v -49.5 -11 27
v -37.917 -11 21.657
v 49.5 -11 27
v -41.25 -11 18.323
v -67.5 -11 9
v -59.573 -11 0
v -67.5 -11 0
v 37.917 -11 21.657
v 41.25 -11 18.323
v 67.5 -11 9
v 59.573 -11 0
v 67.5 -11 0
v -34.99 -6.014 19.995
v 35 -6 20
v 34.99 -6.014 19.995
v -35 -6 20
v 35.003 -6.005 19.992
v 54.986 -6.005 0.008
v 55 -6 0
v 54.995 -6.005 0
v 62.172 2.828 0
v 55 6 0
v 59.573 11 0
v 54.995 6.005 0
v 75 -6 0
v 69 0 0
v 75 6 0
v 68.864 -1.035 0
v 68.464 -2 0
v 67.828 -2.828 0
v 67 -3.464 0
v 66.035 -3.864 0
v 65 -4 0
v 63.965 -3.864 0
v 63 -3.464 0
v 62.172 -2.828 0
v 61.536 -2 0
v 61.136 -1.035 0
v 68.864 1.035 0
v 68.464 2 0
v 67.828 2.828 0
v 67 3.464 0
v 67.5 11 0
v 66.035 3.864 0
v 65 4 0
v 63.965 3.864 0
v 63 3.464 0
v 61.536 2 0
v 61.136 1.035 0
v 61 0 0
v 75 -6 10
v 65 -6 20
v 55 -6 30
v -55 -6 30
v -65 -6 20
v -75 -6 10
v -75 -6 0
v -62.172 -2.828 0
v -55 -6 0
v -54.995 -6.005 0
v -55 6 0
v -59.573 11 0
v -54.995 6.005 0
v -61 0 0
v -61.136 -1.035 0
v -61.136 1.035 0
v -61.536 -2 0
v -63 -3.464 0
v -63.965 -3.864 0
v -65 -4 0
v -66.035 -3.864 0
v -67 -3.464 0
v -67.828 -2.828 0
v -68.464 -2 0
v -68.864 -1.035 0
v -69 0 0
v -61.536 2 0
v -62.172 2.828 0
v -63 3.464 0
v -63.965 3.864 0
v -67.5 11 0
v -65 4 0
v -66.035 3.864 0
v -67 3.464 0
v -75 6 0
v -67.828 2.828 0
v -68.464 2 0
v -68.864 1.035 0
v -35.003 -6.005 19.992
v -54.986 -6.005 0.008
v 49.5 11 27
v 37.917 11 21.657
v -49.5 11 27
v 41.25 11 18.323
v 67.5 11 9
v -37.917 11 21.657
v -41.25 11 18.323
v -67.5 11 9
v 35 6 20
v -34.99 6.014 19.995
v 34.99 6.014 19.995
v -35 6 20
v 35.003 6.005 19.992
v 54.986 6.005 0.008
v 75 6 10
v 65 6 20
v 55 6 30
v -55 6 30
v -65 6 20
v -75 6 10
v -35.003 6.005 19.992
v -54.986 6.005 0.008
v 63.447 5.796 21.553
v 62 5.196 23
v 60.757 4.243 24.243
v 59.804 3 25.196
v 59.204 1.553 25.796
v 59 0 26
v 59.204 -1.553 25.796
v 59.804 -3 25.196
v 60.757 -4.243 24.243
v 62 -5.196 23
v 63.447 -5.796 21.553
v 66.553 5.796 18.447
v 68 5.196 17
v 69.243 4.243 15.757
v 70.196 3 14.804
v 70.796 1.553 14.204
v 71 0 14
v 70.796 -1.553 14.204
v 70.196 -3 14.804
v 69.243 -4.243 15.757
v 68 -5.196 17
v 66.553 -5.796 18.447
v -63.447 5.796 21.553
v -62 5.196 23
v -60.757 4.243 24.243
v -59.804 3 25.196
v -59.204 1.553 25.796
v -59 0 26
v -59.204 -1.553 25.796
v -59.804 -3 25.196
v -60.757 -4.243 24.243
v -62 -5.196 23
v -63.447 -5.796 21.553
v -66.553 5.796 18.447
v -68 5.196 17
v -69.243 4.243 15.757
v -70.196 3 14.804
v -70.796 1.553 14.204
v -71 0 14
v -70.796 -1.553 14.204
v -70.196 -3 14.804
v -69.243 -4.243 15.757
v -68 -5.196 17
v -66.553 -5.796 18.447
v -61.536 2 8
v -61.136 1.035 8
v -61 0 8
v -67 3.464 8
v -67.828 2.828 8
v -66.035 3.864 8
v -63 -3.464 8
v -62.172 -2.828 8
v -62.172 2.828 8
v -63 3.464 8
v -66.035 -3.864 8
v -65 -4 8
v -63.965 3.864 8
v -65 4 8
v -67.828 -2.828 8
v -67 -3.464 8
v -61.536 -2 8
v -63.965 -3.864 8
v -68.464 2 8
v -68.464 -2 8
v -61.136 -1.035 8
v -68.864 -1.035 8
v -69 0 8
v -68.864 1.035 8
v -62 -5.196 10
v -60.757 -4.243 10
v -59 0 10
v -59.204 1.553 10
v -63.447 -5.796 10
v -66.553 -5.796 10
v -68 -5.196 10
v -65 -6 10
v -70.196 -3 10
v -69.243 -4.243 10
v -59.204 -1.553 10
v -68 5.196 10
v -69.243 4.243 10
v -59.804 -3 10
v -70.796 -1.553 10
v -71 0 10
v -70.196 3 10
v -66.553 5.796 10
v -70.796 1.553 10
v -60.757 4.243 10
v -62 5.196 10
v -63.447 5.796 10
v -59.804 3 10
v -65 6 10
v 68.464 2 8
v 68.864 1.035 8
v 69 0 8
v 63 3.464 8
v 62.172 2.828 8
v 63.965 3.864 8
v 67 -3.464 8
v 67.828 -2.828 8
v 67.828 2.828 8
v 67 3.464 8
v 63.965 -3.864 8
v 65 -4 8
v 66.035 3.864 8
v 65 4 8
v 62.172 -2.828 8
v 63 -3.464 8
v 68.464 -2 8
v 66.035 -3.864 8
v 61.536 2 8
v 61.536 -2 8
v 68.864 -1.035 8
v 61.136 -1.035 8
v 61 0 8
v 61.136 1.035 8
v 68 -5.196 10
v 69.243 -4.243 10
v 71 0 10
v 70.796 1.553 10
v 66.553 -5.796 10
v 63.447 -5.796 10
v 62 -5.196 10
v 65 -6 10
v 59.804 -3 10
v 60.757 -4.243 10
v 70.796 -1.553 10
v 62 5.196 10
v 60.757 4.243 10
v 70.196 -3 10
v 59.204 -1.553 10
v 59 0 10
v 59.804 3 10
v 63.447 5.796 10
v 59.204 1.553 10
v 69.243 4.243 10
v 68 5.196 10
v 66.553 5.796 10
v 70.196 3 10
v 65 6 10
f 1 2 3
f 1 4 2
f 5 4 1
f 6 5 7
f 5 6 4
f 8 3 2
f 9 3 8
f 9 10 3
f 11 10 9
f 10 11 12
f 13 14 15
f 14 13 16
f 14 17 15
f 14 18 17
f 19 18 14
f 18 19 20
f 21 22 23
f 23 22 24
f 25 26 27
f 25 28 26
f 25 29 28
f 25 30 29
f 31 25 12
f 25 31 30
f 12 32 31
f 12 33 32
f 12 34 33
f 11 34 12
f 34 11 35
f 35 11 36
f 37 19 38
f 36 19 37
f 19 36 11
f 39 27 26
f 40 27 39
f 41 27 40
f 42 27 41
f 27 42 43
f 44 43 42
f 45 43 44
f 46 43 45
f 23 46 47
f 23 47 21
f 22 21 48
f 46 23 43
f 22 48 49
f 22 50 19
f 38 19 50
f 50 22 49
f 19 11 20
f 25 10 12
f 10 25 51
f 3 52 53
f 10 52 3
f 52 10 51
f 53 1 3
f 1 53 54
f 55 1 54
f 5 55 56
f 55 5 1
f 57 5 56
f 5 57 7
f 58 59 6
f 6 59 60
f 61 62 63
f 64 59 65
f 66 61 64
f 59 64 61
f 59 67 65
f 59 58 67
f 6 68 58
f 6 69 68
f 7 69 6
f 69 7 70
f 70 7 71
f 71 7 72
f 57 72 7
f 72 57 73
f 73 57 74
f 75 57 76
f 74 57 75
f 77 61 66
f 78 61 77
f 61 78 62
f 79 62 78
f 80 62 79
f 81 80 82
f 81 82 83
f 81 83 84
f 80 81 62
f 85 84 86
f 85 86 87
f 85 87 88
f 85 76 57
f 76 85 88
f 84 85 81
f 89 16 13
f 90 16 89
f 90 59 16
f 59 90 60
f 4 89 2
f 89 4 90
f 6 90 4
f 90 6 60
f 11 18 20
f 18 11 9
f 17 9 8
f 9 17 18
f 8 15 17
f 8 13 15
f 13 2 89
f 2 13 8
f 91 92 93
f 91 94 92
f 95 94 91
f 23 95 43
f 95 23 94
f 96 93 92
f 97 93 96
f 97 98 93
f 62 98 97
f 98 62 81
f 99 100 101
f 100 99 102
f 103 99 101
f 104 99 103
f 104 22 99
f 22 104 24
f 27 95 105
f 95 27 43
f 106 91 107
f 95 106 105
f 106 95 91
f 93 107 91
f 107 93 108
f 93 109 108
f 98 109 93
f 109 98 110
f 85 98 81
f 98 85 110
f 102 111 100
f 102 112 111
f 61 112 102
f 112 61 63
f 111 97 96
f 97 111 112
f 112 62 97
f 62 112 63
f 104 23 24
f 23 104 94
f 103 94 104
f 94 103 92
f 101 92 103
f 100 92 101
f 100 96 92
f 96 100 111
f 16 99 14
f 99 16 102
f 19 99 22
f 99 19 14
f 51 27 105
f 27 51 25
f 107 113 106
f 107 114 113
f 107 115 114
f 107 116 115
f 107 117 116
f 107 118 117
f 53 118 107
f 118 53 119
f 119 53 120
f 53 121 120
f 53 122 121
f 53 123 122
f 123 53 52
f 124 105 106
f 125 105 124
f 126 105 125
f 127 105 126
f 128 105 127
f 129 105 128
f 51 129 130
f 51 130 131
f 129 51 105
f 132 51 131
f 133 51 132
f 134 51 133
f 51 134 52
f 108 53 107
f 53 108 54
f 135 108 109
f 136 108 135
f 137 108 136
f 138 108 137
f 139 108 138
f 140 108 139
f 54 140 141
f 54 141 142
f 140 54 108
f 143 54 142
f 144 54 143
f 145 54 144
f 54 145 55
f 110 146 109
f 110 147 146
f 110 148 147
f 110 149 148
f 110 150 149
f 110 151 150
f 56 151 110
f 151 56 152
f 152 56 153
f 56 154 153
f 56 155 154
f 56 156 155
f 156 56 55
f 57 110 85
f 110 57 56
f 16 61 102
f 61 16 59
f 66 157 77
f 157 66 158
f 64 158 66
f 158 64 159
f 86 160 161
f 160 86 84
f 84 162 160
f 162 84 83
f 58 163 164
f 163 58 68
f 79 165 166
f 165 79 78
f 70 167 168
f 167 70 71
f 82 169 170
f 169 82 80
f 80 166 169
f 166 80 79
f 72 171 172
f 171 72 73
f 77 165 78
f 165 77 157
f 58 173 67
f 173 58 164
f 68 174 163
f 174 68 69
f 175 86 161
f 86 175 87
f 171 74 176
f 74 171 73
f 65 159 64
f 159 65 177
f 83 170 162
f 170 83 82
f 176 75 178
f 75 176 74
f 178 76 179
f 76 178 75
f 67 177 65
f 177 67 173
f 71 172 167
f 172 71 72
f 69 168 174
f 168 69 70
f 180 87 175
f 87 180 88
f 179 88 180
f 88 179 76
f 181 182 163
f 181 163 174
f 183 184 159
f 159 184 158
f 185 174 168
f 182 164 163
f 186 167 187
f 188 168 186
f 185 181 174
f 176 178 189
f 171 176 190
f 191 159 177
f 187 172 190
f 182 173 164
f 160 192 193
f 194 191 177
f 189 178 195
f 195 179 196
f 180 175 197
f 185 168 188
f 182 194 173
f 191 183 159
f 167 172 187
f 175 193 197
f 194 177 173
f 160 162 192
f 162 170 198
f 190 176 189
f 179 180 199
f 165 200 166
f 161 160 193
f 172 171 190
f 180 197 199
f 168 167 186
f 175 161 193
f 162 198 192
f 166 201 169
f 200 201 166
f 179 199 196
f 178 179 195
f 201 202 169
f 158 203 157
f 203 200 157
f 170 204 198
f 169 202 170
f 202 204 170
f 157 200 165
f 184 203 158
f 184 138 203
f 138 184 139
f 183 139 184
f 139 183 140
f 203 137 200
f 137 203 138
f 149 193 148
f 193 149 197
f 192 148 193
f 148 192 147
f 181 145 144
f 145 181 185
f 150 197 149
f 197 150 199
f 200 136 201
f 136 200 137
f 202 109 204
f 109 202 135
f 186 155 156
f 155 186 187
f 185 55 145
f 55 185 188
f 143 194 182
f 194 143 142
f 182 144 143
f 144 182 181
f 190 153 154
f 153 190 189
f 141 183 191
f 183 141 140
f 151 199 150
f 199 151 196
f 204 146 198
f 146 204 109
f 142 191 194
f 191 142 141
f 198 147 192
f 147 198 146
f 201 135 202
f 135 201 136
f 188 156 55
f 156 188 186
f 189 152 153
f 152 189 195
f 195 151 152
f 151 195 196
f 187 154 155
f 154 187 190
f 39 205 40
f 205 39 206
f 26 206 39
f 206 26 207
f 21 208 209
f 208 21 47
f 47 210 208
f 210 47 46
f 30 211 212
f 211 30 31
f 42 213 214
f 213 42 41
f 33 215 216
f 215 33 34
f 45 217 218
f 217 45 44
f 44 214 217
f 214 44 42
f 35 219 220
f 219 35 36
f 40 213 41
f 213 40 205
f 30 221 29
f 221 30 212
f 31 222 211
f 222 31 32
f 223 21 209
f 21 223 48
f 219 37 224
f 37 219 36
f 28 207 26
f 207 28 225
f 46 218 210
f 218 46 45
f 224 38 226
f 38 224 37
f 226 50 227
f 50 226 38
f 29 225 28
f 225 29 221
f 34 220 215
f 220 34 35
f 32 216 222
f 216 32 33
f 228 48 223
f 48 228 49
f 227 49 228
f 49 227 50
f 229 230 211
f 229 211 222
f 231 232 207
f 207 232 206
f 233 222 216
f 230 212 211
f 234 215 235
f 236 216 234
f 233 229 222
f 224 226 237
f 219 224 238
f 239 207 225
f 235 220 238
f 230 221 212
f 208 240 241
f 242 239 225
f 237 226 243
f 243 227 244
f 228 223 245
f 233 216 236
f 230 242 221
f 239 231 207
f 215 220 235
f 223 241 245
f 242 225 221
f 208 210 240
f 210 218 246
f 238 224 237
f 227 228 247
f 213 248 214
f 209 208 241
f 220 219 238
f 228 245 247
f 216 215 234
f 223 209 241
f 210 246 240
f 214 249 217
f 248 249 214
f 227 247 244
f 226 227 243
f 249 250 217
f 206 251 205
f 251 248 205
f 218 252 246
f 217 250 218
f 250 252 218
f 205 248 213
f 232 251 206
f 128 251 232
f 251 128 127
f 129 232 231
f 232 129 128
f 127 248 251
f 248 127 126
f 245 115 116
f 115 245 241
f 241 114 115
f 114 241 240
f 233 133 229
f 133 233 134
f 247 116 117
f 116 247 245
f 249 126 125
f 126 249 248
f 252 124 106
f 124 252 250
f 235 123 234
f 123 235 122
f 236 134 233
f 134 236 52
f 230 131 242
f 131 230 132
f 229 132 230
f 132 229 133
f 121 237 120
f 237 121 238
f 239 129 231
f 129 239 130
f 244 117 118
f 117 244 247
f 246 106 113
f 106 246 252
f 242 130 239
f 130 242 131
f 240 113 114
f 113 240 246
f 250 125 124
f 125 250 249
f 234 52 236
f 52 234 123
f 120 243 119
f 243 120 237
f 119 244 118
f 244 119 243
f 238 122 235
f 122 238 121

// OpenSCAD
length = 150;
height = 30;
materialWidth = 10;

mountPointLength = 20;

// Edges represent the upper and lower edge of the extruded polygon
function topEdge() = [[0, materialWidth], [mountPointLength, height], [length - mountPointLength, height], [length, materialWidth]];
function bottomEdge() = [[length, 0], [length - mountPointLength, 0], [length - 2*mountPointLength, height - materialWidth], [2 * mountPointLength, height - materialWidth], [mountPointLength, 0], [0, 0]];

module shape() {
  translate([-0.5 * length, 0, 0]) polygon(points =
    concat(topEdge(), bottomEdge())
  );
}

module innerShape() {
  translate([-0.5 * length, 0, 0]) polygon(bottomEdge());
}

module edgeShape() {
  difference() {
    linear_extrude(height = 5, scale = 0.9) shape();
    translate([0, -0.01, 0]) // Z-Fight fix
      linear_extrude(height = 6, scale = 1.1)
      innerShape();
  }
}

module screw(radius = 4, headRadius = 6, headHeight = 2, screwDepth = 20, headDepth = 40) {
  union() {
    translate([0, 0, -screwDepth - headHeight]) cylinder(r1 = radius, r2 = radius, h = screwDepth, $fn = 24);
    translate([0, 0, -headHeight]) cylinder(r1 = radius, r2 = headRadius, h = headHeight, $fn = 24);
    cylinder(r1 = headRadius, r2 = headRadius, h = headDepth, $fn = 24);
  }
}

module handleShape() {
  translate([0, 6, 0]) rotate([90, 0, 0]) union() {
    translate([0, 0, 12]) edgeShape();
    linear_extrude(height = 12) shape();
    translate([0, 0, 0]) mirror([0, 0, 1]) edgeShape();
  }
}

module handle() {
  screwCenterOffset = (length/2 - mountPointLength/2);
  screwHeightOffset = materialWidth;
  difference() {
    handleShape();
    translate([-screwCenterOffset, 0, screwHeightOffset]) screw();
    translate([screwCenterOffset, 0, screwHeightOffset]) screw();
  }
}

color("grey") handle();
